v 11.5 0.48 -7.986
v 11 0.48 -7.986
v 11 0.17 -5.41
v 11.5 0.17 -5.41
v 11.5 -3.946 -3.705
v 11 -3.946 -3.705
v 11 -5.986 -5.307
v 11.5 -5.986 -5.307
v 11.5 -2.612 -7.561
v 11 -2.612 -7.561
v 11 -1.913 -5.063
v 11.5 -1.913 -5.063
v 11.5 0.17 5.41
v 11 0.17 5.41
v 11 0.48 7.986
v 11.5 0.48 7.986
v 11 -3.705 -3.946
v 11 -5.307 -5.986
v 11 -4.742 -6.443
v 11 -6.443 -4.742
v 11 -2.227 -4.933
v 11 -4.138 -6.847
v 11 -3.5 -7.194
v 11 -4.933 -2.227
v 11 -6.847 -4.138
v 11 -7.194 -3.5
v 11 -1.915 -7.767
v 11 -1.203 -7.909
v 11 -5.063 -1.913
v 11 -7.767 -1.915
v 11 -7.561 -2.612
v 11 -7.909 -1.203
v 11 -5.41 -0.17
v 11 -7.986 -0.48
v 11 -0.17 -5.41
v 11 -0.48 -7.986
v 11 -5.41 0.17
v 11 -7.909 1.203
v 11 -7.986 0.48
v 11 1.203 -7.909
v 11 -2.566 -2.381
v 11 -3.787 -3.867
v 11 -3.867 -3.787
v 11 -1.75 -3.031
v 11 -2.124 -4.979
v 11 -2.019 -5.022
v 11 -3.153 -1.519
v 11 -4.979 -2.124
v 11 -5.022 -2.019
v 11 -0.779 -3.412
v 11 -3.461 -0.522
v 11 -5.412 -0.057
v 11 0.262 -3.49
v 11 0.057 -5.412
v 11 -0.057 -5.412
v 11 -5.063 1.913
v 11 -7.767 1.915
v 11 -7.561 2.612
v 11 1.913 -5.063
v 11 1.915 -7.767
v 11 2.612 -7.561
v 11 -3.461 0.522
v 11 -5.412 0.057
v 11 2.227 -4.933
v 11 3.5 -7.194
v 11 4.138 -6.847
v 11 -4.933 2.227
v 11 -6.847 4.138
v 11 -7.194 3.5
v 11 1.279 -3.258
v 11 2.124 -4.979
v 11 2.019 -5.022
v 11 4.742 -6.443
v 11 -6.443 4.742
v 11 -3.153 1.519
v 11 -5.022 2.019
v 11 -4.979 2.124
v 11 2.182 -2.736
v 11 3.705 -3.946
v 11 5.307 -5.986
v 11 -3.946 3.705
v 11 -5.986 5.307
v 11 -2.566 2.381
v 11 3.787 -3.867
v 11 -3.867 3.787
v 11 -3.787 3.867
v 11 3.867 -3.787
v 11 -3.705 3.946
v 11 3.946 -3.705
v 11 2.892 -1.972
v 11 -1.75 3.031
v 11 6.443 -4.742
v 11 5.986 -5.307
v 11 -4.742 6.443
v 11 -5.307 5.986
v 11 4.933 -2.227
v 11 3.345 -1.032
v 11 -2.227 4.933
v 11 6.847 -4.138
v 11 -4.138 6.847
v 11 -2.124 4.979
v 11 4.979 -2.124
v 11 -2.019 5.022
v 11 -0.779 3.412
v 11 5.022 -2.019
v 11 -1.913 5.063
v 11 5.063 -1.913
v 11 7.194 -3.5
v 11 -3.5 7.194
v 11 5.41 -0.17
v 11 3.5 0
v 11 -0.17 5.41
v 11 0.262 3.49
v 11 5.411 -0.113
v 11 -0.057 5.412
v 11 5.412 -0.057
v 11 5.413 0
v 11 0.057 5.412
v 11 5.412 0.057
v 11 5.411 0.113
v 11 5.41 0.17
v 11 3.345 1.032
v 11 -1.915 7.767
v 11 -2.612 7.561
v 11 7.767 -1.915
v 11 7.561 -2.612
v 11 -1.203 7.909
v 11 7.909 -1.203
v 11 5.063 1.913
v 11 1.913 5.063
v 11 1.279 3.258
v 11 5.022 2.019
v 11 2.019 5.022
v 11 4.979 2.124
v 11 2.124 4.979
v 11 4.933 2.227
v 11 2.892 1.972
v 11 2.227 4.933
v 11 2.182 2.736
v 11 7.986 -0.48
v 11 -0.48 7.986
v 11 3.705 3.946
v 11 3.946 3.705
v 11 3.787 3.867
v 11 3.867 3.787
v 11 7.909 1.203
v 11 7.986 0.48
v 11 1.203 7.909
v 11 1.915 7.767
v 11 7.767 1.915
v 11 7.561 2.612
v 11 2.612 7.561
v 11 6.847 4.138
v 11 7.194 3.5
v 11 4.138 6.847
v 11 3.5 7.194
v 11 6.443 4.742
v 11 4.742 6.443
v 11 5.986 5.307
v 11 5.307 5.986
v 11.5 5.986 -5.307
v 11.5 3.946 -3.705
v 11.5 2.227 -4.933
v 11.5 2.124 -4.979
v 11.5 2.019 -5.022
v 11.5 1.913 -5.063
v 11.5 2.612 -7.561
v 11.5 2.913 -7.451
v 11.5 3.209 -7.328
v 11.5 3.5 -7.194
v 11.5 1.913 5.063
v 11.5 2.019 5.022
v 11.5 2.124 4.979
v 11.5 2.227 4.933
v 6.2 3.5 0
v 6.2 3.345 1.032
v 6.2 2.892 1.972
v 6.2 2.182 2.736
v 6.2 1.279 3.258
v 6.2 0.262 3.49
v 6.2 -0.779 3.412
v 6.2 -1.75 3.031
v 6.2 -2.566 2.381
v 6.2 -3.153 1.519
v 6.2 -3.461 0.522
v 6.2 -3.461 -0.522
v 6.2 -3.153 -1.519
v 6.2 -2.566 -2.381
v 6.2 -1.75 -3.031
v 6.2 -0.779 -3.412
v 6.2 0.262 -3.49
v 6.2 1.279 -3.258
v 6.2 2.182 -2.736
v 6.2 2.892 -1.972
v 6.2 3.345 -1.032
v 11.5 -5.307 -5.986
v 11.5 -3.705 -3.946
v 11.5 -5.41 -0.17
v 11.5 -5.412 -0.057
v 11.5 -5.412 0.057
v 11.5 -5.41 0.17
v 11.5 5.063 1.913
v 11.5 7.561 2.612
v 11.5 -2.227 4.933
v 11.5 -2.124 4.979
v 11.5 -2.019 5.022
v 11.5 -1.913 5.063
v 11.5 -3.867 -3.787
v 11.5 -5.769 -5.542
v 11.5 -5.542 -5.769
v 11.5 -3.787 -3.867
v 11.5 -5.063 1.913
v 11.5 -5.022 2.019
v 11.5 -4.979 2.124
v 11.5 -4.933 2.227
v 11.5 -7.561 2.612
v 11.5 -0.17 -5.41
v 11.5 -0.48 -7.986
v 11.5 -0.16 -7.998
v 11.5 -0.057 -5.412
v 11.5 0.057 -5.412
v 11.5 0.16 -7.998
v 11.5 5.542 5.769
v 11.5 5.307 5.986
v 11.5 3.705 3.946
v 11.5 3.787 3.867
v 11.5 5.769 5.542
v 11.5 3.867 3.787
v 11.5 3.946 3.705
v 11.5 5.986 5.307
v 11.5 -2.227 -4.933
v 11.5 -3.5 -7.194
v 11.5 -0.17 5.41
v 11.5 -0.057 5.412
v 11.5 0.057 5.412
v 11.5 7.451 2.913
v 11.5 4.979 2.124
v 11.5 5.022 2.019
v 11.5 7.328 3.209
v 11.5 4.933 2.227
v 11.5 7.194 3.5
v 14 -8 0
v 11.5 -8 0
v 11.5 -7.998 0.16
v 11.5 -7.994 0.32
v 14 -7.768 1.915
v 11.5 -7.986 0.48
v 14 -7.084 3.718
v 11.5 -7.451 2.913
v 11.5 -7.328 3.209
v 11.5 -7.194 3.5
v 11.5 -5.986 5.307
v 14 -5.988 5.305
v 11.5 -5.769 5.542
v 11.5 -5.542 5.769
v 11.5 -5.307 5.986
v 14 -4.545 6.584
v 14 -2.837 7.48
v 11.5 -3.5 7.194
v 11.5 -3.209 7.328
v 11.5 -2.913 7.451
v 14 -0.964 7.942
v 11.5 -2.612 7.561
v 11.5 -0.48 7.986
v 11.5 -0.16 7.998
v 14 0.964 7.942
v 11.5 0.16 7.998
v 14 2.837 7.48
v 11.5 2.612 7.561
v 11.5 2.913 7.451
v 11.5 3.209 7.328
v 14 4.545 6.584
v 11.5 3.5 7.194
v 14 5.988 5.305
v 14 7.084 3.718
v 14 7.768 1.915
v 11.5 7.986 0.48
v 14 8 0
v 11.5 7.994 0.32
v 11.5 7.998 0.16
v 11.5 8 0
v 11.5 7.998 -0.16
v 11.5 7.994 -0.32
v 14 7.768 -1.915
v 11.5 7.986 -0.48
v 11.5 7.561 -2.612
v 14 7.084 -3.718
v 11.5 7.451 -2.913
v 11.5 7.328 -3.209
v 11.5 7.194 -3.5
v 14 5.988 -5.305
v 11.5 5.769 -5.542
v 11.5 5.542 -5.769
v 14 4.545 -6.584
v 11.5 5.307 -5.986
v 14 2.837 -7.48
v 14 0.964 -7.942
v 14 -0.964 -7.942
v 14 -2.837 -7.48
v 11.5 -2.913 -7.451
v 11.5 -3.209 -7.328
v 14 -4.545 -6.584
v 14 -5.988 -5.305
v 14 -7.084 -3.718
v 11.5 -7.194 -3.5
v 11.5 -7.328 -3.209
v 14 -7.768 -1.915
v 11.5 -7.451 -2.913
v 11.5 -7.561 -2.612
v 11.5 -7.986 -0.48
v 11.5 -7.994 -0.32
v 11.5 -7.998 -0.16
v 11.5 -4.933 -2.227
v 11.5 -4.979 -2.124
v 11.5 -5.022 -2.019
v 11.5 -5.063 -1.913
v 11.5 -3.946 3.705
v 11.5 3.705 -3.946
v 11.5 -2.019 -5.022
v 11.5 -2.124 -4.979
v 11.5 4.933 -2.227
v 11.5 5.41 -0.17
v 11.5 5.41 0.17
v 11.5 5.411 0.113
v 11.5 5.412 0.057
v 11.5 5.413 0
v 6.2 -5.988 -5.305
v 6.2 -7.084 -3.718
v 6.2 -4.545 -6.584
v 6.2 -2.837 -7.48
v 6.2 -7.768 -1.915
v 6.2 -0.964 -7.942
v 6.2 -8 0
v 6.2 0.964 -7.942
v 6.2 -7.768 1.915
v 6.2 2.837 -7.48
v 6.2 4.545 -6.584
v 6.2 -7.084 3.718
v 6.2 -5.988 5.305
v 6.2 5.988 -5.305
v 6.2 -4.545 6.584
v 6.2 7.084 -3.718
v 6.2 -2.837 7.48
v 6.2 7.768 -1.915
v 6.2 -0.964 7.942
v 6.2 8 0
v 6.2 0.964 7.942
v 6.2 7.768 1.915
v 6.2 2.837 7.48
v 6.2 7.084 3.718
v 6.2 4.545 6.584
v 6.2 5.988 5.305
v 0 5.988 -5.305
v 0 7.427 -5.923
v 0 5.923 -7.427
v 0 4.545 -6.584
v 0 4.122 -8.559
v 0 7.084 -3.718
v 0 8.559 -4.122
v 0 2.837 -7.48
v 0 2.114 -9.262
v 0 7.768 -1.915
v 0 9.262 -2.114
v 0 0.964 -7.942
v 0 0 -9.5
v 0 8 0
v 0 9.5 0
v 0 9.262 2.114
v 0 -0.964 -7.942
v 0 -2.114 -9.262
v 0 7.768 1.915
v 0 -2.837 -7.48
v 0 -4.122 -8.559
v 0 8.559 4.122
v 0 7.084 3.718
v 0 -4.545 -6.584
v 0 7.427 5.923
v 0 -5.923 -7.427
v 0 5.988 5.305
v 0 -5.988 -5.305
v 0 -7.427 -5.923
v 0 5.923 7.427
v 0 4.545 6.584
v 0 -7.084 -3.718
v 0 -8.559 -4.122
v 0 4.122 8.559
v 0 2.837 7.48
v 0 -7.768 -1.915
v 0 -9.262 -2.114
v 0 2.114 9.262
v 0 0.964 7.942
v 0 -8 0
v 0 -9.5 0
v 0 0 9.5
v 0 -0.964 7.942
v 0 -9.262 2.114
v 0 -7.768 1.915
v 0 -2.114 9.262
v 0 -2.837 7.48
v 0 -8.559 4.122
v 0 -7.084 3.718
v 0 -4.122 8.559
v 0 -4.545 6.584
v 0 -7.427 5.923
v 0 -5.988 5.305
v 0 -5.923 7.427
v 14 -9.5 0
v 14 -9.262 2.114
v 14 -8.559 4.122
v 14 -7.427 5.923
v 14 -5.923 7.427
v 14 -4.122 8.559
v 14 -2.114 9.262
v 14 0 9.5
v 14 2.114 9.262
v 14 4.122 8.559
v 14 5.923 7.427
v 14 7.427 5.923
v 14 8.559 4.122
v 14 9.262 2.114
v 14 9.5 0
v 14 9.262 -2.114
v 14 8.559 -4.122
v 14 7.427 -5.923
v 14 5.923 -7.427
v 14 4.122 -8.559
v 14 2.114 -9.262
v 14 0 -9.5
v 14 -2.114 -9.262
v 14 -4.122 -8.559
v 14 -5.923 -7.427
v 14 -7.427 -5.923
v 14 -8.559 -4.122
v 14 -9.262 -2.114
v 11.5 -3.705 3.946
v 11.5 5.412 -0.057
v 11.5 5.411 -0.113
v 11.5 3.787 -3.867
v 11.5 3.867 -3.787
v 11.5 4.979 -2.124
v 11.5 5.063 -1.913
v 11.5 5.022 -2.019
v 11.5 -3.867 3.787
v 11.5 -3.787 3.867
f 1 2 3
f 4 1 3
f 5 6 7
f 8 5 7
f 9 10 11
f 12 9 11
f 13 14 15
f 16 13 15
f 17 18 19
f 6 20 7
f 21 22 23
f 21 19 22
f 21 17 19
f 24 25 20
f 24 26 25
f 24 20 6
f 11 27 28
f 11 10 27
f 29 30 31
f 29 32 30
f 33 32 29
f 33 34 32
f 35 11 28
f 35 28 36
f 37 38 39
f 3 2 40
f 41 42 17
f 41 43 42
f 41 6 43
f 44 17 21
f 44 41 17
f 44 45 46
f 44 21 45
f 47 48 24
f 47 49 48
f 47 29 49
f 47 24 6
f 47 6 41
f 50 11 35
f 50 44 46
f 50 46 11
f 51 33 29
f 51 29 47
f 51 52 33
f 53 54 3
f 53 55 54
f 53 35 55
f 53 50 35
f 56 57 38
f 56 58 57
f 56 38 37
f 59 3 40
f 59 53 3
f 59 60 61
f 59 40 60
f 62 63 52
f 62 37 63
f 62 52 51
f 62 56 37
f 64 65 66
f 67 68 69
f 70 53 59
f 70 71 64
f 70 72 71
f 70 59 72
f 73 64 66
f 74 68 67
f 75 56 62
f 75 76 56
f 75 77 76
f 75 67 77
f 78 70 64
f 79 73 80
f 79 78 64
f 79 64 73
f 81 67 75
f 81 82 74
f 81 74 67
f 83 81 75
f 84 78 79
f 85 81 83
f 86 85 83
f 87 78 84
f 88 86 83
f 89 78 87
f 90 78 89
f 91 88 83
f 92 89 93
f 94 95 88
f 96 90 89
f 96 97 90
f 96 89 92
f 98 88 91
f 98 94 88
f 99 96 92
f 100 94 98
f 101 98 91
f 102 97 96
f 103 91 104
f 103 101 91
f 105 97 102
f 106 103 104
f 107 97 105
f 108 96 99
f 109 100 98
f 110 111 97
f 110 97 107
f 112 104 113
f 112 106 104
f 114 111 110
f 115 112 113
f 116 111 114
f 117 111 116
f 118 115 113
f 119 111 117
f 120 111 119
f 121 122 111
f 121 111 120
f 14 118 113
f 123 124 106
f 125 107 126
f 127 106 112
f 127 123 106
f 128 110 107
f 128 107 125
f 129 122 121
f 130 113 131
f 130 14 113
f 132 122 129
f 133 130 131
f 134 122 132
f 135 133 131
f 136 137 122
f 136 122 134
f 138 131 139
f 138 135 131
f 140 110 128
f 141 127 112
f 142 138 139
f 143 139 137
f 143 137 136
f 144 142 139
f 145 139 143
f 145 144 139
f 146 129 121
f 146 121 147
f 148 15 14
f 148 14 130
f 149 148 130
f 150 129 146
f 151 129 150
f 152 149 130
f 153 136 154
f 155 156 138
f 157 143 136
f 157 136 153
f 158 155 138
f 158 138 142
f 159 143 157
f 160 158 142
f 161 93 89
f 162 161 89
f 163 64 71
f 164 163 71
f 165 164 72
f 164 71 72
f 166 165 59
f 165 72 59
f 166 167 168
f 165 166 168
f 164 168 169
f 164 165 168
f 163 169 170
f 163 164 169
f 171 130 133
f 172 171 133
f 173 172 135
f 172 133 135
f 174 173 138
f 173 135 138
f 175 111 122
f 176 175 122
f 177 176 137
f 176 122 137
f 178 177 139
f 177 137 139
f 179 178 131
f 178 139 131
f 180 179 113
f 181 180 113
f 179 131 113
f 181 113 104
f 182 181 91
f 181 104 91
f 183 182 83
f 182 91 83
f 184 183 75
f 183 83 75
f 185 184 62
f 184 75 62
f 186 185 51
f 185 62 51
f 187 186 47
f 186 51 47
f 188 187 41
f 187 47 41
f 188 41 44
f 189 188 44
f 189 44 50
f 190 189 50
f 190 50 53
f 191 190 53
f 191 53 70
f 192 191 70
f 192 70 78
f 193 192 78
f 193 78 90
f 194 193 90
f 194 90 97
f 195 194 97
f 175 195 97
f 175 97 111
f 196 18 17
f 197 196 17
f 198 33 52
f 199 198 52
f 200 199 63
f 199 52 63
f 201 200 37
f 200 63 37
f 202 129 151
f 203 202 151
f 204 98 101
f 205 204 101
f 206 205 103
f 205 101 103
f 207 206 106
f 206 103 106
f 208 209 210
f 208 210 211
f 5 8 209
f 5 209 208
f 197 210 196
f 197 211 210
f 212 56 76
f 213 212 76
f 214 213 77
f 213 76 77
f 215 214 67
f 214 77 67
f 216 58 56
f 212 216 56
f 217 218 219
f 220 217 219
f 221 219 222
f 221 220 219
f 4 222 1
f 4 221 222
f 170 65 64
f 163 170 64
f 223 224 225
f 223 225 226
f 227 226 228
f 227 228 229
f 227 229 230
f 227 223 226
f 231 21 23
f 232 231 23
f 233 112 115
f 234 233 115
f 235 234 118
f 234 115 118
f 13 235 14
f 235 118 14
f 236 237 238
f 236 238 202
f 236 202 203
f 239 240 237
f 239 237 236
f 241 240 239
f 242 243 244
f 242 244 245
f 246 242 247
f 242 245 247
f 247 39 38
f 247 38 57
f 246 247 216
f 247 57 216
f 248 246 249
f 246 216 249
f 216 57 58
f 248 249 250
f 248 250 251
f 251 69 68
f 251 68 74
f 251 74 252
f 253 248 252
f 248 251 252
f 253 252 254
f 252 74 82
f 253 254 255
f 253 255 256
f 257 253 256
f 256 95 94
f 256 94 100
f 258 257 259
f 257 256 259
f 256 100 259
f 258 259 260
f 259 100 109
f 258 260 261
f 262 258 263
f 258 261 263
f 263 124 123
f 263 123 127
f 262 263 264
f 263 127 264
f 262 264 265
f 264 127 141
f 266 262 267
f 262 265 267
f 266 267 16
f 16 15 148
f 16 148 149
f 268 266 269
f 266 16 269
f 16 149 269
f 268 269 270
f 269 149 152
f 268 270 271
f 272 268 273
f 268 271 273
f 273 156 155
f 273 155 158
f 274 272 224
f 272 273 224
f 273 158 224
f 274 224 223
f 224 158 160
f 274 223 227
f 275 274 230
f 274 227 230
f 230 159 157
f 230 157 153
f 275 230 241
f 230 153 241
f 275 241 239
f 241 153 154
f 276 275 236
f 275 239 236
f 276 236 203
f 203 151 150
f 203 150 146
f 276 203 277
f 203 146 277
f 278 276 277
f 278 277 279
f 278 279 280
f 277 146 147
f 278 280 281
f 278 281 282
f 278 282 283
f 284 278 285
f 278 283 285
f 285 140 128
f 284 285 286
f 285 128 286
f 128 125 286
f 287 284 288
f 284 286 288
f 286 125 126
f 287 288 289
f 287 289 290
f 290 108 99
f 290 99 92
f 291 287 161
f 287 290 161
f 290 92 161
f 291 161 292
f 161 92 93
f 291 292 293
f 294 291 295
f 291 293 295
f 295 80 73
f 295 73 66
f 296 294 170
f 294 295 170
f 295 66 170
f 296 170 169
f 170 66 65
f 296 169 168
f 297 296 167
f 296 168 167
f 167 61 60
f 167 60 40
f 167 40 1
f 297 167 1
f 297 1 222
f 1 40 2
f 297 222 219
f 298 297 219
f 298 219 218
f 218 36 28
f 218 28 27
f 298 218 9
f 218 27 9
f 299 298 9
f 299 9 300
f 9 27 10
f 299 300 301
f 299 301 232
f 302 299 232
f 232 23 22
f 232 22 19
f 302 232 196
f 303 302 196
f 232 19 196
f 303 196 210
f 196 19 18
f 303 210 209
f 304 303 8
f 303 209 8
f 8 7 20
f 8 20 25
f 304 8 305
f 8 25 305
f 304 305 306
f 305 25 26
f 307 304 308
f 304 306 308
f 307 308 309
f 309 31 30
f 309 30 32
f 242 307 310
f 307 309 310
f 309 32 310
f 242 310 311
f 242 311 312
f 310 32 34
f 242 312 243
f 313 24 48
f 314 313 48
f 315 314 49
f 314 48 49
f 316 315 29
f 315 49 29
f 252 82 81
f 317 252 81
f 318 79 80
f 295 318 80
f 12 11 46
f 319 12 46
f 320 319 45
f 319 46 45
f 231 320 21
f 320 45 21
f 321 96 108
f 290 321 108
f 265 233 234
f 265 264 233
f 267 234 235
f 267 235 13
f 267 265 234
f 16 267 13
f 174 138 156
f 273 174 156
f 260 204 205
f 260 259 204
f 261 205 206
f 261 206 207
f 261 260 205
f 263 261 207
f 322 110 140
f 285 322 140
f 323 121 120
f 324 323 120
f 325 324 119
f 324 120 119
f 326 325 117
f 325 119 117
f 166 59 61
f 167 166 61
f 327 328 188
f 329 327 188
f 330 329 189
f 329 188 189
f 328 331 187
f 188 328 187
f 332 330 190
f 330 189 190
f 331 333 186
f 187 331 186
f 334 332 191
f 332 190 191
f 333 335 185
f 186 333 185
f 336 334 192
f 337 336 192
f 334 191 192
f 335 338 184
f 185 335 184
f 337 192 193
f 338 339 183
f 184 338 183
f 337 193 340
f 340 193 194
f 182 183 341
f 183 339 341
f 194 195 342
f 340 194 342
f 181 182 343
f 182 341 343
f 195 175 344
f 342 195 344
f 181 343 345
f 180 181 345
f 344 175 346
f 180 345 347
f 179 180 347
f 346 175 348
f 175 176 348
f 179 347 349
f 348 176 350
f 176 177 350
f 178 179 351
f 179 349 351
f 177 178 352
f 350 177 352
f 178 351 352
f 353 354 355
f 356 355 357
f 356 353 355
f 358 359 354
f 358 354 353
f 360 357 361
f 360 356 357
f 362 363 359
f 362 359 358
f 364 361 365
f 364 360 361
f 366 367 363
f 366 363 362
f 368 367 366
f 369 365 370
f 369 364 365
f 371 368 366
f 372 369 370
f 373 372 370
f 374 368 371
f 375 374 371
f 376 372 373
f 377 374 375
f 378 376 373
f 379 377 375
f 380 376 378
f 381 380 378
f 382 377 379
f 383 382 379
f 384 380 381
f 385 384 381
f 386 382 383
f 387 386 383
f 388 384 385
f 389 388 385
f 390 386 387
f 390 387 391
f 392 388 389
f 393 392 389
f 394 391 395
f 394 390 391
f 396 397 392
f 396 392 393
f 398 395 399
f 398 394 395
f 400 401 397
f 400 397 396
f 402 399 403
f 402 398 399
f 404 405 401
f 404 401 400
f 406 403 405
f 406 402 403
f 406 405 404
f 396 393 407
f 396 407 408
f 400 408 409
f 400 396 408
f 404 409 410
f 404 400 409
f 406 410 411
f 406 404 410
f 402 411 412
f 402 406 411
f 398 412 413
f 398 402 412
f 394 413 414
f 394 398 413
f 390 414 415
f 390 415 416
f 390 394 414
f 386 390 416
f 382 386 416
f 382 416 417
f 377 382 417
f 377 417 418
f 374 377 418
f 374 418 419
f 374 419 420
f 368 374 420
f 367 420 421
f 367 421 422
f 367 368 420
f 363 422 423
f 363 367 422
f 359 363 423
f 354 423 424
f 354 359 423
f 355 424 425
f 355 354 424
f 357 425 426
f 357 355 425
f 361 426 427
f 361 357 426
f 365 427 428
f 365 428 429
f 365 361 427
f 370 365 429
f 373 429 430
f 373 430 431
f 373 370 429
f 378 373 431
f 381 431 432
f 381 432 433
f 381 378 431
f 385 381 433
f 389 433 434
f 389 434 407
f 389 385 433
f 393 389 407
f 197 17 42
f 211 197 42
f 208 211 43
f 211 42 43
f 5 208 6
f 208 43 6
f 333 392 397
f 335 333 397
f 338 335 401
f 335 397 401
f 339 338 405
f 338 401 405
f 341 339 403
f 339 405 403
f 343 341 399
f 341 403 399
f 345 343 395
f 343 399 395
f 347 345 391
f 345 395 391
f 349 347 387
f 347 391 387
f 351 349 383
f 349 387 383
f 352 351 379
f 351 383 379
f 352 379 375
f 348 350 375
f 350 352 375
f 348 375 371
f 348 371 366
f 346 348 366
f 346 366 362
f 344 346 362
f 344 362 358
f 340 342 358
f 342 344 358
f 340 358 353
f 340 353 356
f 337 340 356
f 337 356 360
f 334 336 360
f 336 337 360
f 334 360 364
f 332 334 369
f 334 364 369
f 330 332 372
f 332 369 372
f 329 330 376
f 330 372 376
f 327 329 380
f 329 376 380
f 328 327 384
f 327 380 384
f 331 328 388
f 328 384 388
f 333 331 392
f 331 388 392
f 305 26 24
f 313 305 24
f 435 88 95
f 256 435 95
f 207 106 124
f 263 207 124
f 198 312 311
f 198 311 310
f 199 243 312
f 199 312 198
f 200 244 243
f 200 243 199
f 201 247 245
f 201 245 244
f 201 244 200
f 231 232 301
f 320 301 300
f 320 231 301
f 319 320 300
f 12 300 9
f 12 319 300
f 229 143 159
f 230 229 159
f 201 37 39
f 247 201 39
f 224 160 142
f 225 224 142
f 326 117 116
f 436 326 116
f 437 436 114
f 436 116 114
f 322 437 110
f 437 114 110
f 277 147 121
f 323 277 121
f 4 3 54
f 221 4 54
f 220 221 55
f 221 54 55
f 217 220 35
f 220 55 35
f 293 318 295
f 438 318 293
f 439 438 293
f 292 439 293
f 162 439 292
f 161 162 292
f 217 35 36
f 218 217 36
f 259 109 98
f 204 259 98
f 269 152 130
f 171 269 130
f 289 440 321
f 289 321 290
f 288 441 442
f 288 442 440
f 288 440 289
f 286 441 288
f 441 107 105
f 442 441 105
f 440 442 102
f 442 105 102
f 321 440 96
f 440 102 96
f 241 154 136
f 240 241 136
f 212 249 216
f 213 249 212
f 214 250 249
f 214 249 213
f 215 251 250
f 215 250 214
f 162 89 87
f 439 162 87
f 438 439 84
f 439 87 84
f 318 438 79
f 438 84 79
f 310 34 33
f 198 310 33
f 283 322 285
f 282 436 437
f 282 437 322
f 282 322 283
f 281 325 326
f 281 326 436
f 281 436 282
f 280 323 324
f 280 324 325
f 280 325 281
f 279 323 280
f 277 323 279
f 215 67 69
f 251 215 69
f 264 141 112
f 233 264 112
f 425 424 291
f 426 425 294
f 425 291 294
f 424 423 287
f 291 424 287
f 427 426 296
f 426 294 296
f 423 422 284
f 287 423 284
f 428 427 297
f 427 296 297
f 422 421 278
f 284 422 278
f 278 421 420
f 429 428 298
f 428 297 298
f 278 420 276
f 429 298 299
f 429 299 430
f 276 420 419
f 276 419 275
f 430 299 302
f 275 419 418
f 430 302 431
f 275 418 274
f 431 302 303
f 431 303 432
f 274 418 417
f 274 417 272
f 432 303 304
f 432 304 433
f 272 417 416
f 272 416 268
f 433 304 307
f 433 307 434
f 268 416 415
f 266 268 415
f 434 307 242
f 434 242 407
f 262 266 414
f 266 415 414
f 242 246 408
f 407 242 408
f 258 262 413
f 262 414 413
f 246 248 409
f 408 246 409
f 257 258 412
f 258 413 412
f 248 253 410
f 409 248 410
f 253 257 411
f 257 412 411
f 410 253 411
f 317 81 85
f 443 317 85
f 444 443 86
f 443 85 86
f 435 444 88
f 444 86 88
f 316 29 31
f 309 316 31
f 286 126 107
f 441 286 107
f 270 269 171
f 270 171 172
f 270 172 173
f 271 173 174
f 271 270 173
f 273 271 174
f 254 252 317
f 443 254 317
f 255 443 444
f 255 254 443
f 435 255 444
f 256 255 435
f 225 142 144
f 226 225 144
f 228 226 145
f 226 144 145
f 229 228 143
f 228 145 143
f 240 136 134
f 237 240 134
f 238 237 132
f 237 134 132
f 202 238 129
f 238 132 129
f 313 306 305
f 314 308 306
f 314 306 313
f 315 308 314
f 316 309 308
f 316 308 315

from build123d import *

# Parameters (mm, degrees)
F0_R     = 8
F1_DEPTH = 14
F2_R     = 9.5
F2_R_2   = 8
F3_DEPTH = 14
F4_DEPTH = 3
F5_DEPTH = 6.2
F6_R     = 3.5
F7_DEPTH = 11.001
F9_DEPTH = 0.5


with BuildPart() as f1:
    # F0 (on Right) → F1 (new body)
    with BuildSketch(Plane.YZ):
        Circle(F0_R)
    extrude(amount=F1_DEPTH)

    # F4 (cut): a face of the model
    f4_faces = [f1.faces().sort_by_distance(p)[0] for p in [
        (14, 0, 0),
    ]]
    extrude(f4_faces, amount=-F4_DEPTH, mode=Mode.SUBTRACT)

    # F5 (cut): a face of the model
    f5_faces = [f1.faces().sort_by_distance(p)[0] for p in [
        (0, 0, 0),
    ]]
    extrude(f5_faces, amount=-F5_DEPTH, mode=Mode.SUBTRACT)

    # F6 (on face) → F7 (cut, through all)
    with BuildSketch(Plane.YZ.offset(11)):
        Circle(F6_R)
    extrude(amount=-F7_DEPTH, mode=Mode.SUBTRACT)



with BuildPart() as f3:
    # F2 (on face) → F3 (new body)
    with BuildSketch(Plane(origin=(0, 0, 0), x_dir=(0, -1, 0), z_dir=(-1, 0, 0))):
        Circle(F2_R)
        Circle(F2_R_2, mode=Mode.SUBTRACT)
    extrude(amount=-F3_DEPTH)


with BuildPart() as f1_1:
    add(f1.part)

    add(f3.part)  # F9 merges F3
    # F8 (on face) → F9 (join)
    with BuildSketch(Plane.YZ.offset(11)):
        with BuildLine():
            ThreePointArc((-3.7052864958, -3.9455150793), (-3.8272860657, -3.8272860657), (-3.9455150793, -3.7052864958))
            Line((-3.9455150793, -3.7052864958), (-5.9861921895, -5.3071181511))
            ThreePointArc((-5.9861921895, -5.3071181511), (-5.6568542495, -5.6568542495), (-5.3071181511, -5.9861921895))
            Line((-5.3071181511, -5.9861921895), (-3.7052864958, -3.9455150793))
        make_face()
        with BuildLine():
            ThreePointArc((-4.9331216086, -2.2272288729), (-5.0005902294, -2.0713122929), (-5.0631323811, -1.9133551026))
            Line((-5.0631323811, -1.9133551026), (-7.5614666316, -2.6123212626))
            ThreePointArc((-7.5614666316, -2.6123212626), (-7.3910362601, -3.0614674589), (-7.1939544103, -3.4995742515))
            Line((-7.1939544103, -3.4995742515), (-4.9331216086, -2.2272288729))
        make_face()
        with BuildLine():
            ThreePointArc((-5.4099336753, -0.1698672604), (-5.4125998612, 0), (-5.4099336753, 0.1698672604))
            Line((-5.4099336753, 0.1698672604), (-7.9855763239, 0.4801778575))
            ThreePointArc((-7.9855763239, 0.4801778575), (-8, 0), (-7.9855763239, -0.4801778575))
            Line((-7.9855763239, -0.4801778575), (-5.4099336753, -0.1698672604))
        make_face()
        with BuildLine():
            ThreePointArc((-5.0631323811, 1.9133551026), (-5.0005902294, 2.0713122929), (-4.9331216086, 2.2272288729))
            Line((-4.9331216086, 2.2272288729), (-7.1939544103, 3.4995742515))
            ThreePointArc((-7.1939544103, 3.4995742515), (-7.3910362601, 3.0614674589), (-7.5614666316, 2.6123212626))
            Line((-7.5614666316, 2.6123212626), (-5.0631323811, 1.9133551026))
        make_face()
        with BuildLine():
            ThreePointArc((-3.9455150793, 3.7052864958), (-3.8272860657, 3.8272860657), (-3.7052864958, 3.9455150793))
            Line((-3.7052864958, 3.9455150793), (-5.3071181511, 5.9861921895))
            ThreePointArc((-5.3071181511, 5.9861921895), (-5.6568542495, 5.6568542495), (-5.9861921895, 5.3071181511))
            Line((-5.9861921895, 5.3071181511), (-3.9455150793, 3.7052864958))
        make_face()
        with BuildLine():
            ThreePointArc((-2.2272288729, 4.9331216086), (-2.0713122929, 5.0005902294), (-1.9133551026, 5.0631323811))
            Line((-1.9133551026, 5.0631323811), (-2.6123212626, 7.5614666316))
            ThreePointArc((-2.6123212626, 7.5614666316), (-3.0614674589, 7.3910362601), (-3.4995742515, 7.1939544103))
            Line((-3.4995742515, 7.1939544103), (-2.2272288729, 4.9331216086))
        make_face()
        with BuildLine():
            ThreePointArc((-0.1698672604, 5.4099336753), (0, 5.4125998612), (0.1698672604, 5.4099336753))
            Line((0.1698672604, 5.4099336753), (0.4801778575, 7.9855763239))
            ThreePointArc((0.4801778575, 7.9855763239), (0, 8), (-0.4801778575, 7.9855763239))
            Line((-0.4801778575, 7.9855763239), (-0.1698672604, 5.4099336753))
        make_face()
        with BuildLine():
            Line((2.6123212626, 7.5614666316), (1.9133551026, 5.0631323811))
            ThreePointArc((1.9133551026, 5.0631323811), (2.0713122929, 5.0005902294), (2.2272288729, 4.9331216086))
            Line((2.2272288729, 4.9331216086), (3.4995742515, 7.1939544103))
            ThreePointArc((3.4995742515, 7.1939544103), (3.0614674589, 7.3910362601), (2.6123212626, 7.5614666316))
        make_face()
        with BuildLine():
            Line((5.3071181511, 5.9861921895), (3.7052864958, 3.9455150793))
            ThreePointArc((3.7052864958, 3.9455150793), (3.8272860657, 3.8272860657), (3.9455150793, 3.7052864958))
            Line((3.9455150793, 3.7052864958), (5.9861921895, 5.3071181511))
            ThreePointArc((5.9861921895, 5.3071181511), (5.6568542495, 5.6568542495), (5.3071181511, 5.9861921895))
        make_face()
        with BuildLine():
            Line((7.1939544103, 3.4995742515), (4.9331216086, 2.2272288729))
            ThreePointArc((4.9331216086, 2.2272288729), (5.0005902294, 2.0713122929), (5.0631323811, 1.9133551026))
            Line((5.0631323811, 1.9133551026), (7.5614666316, 2.6123212626))
            ThreePointArc((7.5614666316, 2.6123212626), (7.3910362601, 3.0614674589), (7.1939544103, 3.4995742515))
        make_face()
        with BuildLine():
            Line((7.9855763239, 0.4801778575), (5.4099336753, 0.1698672604))
            ThreePointArc((5.4099336753, 0.1698672604), (5.4119332737, 0.0849440915), (5.4125998612, 0))
            ThreePointArc((5.4125998612, 0), (5.4119332737, -0.0849440915), (5.4099336753, -0.1698672604))
            Line((5.4099336753, -0.1698672604), (7.9855763239, -0.4801778575))
            ThreePointArc((7.9855763239, -0.4801778575), (7.9963932679, -0.2401972196), (8, 0))
            ThreePointArc((8, 0), (7.9963932679, 0.2401972196), (7.9855763239, 0.4801778575))
        make_face()
        with BuildLine():
            Line((7.5614666316, -2.6123212626), (5.0631323811, -1.9133551026))
            ThreePointArc((5.0631323811, -1.9133551026), (5.0005902294, -2.0713122929), (4.9331216086, -2.2272288729))
            Line((4.9331216086, -2.2272288729), (7.1939544103, -3.4995742515))
            ThreePointArc((7.1939544103, -3.4995742515), (7.3910362601, -3.0614674589), (7.5614666316, -2.6123212626))
        make_face()
        with BuildLine():
            Line((5.9861921895, -5.3071181511), (3.9455150793, -3.7052864958))
            ThreePointArc((3.9455150793, -3.7052864958), (3.8272860657, -3.8272860657), (3.7052864958, -3.9455150793))
            Line((3.7052864958, -3.9455150793), (5.3071181511, -5.9861921895))
            ThreePointArc((5.3071181511, -5.9861921895), (5.6568542495, -5.6568542495), (5.9861921895, -5.3071181511))
        make_face()
        with BuildLine():
            Line((3.4995742515, -7.1939544103), (2.2272288729, -4.9331216086))
            ThreePointArc((2.2272288729, -4.9331216086), (2.0713122929, -5.0005902294), (1.9133551026, -5.0631323811))
            Line((1.9133551026, -5.0631323811), (2.6123212626, -7.5614666316))
            ThreePointArc((2.6123212626, -7.5614666316), (3.0614674589, -7.3910362601), (3.4995742515, -7.1939544103))
        make_face()
        with BuildLine():
            ThreePointArc((0.1698672604, -5.4099336753), (0, -5.4125998612), (-0.1698672604, -5.4099336753))
            Line((-0.1698672604, -5.4099336753), (-0.4801778575, -7.9855763239))
            ThreePointArc((-0.4801778575, -7.9855763239), (0, -8), (0.4801778575, -7.9855763239))
            Line((0.4801778575, -7.9855763239), (0.1698672604, -5.4099336753))
        make_face()
        with BuildLine():
            ThreePointArc((-1.9133551026, -5.0631323811), (-2.0713122929, -5.0005902294), (-2.2272288729, -4.9331216086))
            Line((-2.2272288729, -4.9331216086), (-3.4995742515, -7.1939544103))
            ThreePointArc((-3.4995742515, -7.1939544103), (-3.0614674589, -7.3910362601), (-2.6123212626, -7.5614666316))
            Line((-2.6123212626, -7.5614666316), (-1.9133551026, -5.0631323811))
        make_face()
    extrude(amount=F9_DEPTH)


solid = f1_1.part
